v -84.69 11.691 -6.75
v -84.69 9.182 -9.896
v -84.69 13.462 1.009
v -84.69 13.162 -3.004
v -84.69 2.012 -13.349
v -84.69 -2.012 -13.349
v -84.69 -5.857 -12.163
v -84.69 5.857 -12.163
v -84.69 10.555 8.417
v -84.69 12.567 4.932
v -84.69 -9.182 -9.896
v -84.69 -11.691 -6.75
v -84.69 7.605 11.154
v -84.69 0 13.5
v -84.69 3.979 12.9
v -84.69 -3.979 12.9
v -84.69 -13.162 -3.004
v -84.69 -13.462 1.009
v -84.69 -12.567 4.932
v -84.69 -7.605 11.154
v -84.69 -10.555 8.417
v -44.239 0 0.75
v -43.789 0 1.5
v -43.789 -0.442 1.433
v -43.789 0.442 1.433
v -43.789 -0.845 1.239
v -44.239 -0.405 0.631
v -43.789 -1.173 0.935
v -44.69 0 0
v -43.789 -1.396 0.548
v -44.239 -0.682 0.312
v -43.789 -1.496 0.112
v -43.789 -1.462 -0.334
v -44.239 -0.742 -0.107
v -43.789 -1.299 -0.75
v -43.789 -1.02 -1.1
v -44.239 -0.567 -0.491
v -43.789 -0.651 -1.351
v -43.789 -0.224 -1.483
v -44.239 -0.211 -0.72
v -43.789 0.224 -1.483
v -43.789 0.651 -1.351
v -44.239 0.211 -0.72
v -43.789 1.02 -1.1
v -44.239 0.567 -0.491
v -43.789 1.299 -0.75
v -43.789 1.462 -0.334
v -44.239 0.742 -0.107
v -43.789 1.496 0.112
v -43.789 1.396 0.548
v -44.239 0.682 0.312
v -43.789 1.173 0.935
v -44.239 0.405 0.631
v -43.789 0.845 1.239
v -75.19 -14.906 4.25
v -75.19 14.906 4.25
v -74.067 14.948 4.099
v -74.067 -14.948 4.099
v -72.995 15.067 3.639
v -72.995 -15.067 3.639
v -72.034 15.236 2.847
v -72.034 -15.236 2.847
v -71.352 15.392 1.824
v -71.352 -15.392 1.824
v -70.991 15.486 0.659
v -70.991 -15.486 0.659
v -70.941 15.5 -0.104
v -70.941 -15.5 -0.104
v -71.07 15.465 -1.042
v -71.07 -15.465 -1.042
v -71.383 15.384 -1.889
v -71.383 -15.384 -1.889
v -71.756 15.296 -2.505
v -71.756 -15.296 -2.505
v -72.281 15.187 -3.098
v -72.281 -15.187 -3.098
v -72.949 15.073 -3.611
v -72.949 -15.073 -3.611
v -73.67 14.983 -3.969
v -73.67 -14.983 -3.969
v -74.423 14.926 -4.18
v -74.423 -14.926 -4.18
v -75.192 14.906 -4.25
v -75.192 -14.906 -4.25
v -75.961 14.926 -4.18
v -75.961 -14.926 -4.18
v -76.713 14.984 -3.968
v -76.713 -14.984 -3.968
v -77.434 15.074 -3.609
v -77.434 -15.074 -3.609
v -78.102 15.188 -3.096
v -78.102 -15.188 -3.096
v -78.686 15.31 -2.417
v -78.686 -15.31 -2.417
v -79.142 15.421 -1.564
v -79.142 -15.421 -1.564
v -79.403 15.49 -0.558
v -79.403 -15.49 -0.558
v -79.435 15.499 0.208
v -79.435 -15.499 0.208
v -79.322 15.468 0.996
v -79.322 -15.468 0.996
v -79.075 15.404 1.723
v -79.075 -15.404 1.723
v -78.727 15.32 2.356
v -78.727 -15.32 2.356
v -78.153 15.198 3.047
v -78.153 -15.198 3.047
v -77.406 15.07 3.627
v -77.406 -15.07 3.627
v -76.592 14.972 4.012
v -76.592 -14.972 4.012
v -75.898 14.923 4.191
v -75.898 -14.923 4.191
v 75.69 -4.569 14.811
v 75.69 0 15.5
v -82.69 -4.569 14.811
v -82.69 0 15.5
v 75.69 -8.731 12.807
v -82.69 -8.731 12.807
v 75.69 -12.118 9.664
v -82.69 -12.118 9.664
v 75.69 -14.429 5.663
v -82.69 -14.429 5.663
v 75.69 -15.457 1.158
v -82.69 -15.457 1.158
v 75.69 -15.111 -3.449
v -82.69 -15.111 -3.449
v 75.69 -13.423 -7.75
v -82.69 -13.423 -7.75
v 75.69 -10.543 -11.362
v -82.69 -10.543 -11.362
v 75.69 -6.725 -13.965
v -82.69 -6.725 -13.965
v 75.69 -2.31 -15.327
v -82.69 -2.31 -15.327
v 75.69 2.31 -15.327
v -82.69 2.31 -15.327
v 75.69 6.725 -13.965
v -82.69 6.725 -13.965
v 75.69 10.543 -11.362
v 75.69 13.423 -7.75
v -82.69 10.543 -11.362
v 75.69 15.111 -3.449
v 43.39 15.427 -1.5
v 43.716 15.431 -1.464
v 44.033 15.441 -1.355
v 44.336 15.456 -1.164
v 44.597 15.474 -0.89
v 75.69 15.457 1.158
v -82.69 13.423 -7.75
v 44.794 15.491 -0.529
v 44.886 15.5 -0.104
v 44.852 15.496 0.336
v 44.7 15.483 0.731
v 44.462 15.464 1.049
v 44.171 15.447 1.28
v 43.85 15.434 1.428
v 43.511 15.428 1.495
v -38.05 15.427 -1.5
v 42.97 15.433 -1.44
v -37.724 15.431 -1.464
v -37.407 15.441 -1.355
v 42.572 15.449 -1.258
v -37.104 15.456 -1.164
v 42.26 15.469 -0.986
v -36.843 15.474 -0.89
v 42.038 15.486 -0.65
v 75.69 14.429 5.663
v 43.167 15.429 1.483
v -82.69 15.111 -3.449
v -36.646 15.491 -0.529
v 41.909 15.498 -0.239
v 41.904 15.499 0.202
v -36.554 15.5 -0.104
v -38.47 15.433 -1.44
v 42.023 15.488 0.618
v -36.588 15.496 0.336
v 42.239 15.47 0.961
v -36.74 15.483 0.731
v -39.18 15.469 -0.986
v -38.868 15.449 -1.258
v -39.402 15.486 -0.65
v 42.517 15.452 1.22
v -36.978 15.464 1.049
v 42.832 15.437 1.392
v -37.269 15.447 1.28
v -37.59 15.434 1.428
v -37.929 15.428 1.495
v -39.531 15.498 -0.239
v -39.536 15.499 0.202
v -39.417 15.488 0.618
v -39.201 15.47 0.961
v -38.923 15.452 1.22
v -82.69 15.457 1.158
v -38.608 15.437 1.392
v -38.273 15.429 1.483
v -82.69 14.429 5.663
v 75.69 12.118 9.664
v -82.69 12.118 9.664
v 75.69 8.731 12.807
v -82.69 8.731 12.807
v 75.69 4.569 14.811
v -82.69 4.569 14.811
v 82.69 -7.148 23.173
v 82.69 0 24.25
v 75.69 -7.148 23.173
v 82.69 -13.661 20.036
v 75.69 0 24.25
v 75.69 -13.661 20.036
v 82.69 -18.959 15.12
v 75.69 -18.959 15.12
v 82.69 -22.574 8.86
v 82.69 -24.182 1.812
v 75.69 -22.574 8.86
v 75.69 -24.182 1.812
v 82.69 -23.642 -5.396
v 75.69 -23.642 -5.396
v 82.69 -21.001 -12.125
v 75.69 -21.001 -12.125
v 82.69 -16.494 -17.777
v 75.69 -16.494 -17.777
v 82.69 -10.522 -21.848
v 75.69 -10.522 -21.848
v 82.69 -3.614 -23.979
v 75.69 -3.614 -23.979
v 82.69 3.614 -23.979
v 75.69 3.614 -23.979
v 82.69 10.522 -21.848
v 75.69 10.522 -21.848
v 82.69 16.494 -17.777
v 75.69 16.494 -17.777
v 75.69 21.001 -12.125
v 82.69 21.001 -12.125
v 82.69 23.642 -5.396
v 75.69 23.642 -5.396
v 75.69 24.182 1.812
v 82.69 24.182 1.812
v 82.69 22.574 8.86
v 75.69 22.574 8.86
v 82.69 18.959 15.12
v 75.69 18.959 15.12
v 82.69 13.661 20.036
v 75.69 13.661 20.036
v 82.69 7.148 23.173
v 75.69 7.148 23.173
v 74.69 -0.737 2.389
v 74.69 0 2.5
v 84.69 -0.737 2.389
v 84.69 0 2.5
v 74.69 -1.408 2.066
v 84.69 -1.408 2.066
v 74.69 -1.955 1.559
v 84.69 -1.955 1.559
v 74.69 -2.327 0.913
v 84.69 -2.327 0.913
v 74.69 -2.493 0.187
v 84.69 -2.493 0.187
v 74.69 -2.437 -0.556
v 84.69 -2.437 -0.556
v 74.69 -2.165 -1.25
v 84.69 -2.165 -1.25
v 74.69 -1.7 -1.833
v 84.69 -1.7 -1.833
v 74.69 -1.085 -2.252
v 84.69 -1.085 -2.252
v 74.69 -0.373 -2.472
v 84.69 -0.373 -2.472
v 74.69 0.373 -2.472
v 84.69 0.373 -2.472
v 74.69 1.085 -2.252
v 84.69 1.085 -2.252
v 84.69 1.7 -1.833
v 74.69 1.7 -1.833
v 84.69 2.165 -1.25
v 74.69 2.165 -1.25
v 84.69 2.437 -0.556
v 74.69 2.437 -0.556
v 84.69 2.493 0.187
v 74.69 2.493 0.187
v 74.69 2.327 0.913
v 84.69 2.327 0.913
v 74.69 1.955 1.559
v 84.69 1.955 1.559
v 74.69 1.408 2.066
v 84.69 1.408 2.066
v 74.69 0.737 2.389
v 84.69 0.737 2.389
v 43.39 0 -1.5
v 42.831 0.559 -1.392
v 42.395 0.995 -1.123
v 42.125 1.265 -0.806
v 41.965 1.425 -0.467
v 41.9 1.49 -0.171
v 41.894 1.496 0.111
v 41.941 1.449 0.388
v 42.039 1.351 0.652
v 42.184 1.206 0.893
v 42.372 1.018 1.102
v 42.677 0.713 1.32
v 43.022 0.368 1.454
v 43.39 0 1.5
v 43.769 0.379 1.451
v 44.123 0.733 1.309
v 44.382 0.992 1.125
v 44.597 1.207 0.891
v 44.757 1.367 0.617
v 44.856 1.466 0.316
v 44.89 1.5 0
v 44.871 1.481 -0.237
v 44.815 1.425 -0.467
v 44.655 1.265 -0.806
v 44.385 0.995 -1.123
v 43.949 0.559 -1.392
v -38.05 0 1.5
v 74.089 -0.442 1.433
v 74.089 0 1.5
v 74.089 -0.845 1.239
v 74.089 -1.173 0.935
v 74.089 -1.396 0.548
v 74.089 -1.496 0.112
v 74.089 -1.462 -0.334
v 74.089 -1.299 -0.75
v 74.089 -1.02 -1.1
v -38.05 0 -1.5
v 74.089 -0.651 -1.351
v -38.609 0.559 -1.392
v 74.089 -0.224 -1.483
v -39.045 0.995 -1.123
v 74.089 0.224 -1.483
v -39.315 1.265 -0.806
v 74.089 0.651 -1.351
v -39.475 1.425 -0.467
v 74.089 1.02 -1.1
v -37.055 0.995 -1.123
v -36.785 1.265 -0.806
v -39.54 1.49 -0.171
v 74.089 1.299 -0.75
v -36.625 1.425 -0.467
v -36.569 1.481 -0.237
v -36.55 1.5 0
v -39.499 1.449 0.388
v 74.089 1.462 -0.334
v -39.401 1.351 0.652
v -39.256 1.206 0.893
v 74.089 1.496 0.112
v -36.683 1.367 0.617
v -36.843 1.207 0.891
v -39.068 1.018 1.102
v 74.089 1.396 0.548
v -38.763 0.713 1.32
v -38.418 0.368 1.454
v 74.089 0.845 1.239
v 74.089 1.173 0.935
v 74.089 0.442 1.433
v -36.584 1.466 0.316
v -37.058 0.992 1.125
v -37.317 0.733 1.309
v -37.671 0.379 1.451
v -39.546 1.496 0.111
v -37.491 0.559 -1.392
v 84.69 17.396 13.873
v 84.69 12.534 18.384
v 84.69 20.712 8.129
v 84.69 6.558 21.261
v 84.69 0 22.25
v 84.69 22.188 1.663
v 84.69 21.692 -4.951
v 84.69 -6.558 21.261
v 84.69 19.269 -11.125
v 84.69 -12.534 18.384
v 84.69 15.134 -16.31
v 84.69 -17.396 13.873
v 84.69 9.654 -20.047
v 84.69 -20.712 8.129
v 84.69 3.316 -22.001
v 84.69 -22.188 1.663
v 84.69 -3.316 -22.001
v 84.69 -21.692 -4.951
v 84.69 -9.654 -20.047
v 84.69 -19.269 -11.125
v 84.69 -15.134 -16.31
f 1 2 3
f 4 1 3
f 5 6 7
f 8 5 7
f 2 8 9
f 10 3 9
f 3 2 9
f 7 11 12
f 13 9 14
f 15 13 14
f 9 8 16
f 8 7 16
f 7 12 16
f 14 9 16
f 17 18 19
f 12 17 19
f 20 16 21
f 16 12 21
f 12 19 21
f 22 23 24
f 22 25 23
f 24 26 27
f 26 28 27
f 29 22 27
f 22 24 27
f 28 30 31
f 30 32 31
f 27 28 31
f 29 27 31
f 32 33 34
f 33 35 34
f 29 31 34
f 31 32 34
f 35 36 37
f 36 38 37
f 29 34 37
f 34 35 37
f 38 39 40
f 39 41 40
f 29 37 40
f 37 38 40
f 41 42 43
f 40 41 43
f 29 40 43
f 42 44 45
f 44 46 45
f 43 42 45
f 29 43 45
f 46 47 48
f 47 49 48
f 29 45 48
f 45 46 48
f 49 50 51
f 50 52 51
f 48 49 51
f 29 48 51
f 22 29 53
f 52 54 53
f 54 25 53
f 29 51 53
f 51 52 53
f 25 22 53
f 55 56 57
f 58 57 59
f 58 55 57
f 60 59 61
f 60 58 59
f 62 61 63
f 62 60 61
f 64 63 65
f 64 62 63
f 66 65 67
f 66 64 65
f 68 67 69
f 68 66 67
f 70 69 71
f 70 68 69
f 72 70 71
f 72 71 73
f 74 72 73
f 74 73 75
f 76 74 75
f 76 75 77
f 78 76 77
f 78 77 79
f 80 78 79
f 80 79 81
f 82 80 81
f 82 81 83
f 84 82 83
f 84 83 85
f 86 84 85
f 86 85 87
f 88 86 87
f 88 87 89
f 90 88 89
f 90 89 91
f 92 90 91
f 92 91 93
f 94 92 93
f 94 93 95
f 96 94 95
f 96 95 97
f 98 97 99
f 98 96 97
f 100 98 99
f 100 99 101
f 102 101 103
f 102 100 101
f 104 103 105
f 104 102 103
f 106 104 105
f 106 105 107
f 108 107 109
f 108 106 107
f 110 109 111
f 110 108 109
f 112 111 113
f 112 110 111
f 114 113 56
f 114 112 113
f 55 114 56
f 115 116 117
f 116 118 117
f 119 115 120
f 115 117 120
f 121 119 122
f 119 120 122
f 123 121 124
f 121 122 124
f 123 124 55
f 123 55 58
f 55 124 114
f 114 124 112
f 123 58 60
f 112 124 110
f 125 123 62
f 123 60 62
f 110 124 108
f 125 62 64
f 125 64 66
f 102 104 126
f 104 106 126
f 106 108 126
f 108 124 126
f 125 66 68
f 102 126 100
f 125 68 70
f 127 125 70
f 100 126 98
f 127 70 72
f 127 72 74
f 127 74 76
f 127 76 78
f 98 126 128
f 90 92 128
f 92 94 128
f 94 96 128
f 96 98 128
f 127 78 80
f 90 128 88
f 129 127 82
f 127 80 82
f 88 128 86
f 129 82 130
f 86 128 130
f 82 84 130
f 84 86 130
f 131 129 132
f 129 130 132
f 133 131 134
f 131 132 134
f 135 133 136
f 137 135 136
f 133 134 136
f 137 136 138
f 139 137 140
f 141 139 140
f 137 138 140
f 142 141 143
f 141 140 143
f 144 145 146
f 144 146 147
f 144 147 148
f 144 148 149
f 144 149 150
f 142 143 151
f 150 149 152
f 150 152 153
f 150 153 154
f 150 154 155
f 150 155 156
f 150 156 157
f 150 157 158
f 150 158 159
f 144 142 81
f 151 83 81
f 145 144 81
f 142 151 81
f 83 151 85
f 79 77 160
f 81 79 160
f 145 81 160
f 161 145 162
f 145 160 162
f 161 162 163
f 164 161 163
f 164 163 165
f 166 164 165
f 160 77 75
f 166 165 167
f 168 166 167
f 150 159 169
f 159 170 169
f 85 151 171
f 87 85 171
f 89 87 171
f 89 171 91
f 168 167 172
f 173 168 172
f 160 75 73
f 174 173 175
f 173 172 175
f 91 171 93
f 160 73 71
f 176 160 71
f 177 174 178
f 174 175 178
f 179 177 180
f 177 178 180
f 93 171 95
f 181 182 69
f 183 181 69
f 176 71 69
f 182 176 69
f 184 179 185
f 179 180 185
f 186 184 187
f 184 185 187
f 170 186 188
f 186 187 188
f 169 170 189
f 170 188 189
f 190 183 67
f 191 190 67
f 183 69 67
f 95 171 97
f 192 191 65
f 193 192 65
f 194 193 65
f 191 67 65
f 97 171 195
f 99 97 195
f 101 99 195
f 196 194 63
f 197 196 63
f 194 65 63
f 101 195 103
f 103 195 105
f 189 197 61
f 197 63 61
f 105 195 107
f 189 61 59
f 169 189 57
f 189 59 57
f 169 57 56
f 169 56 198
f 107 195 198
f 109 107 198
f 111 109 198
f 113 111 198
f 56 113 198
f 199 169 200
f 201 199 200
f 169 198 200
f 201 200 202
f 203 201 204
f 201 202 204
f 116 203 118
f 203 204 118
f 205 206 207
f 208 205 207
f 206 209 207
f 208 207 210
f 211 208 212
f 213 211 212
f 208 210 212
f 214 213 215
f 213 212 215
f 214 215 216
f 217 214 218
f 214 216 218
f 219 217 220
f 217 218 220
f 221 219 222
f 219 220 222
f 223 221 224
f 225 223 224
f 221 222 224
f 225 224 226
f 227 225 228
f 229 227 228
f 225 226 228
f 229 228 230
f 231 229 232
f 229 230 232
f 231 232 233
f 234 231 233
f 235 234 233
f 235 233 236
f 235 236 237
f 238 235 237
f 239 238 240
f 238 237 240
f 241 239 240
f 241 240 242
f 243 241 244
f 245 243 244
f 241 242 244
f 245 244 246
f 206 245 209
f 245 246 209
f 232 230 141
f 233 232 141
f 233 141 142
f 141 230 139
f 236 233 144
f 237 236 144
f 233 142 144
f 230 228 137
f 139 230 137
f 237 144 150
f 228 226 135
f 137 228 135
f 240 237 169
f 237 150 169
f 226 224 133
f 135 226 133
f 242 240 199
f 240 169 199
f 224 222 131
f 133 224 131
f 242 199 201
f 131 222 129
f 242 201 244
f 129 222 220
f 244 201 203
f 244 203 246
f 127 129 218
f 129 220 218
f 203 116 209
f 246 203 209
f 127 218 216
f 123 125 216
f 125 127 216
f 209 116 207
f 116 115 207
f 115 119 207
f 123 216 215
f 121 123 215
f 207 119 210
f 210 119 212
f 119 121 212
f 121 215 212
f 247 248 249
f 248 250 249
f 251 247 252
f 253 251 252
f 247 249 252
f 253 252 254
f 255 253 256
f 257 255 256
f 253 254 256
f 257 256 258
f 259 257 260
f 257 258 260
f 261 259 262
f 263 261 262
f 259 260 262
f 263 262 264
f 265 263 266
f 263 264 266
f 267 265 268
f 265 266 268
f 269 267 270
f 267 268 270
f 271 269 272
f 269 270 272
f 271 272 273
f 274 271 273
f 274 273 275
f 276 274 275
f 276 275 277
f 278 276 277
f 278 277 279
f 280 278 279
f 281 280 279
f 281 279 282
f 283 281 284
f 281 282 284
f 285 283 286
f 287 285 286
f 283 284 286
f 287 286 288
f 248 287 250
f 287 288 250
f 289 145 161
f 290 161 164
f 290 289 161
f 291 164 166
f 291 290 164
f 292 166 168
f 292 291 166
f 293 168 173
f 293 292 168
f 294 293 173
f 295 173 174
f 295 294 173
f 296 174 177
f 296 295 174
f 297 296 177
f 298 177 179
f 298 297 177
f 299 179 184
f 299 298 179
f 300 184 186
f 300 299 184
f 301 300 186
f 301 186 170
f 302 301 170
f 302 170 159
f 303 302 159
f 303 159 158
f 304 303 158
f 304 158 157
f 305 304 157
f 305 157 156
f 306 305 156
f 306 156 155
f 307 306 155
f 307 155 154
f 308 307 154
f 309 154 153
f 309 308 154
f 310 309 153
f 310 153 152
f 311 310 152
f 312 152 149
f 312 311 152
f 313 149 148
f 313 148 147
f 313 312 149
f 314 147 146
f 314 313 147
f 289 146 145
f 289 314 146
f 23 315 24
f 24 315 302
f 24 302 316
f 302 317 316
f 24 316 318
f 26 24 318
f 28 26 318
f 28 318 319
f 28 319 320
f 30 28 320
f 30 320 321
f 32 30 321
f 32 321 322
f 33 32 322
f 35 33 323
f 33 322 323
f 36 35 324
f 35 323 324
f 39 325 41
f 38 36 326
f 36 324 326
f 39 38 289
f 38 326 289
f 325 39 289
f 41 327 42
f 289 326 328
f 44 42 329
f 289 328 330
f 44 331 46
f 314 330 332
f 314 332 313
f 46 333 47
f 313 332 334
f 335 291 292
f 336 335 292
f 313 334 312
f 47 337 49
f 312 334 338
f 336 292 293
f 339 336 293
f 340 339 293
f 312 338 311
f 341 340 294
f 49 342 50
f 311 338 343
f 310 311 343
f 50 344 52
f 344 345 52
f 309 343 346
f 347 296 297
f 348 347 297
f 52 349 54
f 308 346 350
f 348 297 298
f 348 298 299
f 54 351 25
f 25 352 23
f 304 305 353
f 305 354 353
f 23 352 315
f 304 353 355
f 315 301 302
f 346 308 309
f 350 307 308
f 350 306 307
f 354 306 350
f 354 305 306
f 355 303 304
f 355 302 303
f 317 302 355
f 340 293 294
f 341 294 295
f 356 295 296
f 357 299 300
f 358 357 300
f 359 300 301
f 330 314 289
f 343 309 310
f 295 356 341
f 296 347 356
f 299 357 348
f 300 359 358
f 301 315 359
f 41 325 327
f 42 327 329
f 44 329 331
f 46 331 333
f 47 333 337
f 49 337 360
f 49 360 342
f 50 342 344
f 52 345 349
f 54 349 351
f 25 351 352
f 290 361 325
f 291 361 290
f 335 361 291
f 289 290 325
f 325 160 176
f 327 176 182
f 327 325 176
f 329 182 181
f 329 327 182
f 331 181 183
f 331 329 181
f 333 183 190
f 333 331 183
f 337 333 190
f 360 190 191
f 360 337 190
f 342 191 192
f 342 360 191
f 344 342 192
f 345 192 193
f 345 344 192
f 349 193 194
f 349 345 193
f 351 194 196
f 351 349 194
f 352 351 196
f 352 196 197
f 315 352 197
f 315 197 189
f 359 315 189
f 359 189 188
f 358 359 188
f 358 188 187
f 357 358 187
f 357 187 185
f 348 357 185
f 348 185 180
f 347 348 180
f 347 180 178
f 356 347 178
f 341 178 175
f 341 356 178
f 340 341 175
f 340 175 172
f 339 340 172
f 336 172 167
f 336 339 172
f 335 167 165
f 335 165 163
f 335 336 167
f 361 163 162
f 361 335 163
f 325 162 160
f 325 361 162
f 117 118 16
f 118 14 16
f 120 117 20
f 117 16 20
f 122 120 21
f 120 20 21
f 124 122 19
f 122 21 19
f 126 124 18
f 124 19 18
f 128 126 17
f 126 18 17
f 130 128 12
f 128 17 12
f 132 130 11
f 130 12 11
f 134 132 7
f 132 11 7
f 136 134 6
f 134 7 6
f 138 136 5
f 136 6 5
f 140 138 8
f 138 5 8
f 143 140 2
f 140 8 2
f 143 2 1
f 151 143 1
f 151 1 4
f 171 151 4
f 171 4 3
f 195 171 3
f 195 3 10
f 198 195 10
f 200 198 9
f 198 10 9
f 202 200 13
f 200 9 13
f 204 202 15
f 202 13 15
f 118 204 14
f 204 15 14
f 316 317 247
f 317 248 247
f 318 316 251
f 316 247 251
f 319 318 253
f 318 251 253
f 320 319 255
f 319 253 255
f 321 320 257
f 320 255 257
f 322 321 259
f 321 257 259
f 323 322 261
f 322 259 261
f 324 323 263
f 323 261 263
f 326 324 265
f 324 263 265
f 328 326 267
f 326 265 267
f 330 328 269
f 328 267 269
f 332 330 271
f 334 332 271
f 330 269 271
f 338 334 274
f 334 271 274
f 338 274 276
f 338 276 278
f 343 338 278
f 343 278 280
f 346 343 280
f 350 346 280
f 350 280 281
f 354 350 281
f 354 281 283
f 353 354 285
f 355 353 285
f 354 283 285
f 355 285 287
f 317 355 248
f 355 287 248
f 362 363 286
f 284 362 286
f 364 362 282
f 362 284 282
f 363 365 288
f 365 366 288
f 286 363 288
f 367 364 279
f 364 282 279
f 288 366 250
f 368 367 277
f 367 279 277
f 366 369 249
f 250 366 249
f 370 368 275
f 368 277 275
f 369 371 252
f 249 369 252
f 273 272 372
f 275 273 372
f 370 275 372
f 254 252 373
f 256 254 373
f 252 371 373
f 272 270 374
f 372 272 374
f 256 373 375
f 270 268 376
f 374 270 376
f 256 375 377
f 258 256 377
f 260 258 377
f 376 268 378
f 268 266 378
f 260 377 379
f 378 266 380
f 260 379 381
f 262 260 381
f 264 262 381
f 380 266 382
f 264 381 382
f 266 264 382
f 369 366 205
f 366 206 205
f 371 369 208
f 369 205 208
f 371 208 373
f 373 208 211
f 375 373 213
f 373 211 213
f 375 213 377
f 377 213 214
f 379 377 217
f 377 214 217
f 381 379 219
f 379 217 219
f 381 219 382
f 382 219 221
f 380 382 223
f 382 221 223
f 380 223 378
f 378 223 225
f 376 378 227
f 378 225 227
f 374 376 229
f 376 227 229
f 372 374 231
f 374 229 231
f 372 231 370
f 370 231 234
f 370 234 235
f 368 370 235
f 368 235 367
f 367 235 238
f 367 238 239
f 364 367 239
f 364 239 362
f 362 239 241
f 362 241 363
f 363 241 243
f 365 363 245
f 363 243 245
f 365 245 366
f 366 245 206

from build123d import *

# Parameters (mm, degrees)
ESBO_O2_R                  = 1.5
CORTE_EXTRUS_O1_DEPTH      = 92.370241873
CORTE_EXTRUS_O2_DEPTH      = 92.370241873
CORTE_EXTRUS_O2_DEPTH_BACK = 92.370241873
ESBO_O3_R                  = 4.25


with BuildPart() as part:
    # Esboço1 → Revolução1 (revolve)
    with BuildSketch(Plane.XY, mode=Mode.PRIVATE) as revolu_o1_sk:
        Polygon((84.69, 2.5), (84.69, 22.25), (82.69, 24.25), (75.69, 24.25), (75.69, 15.5), (-82.69, 15.5), (-84.69, 13.5), (-84.69, 0), (-44.69, 0), (-43.788709071, 1.5), (74.089139381, 1.5), (74.69, 2.5), align=None)
    revolve(revolu_o1_sk.sketch.rotate(Axis((-84.69, 0, 0), (1, 0, 0)), 90), axis=Axis((-84.69, 0, 0), (1, 0, 0)))

    # Esboço2 → Corte-extrusão1 (cut, through all)
    with BuildSketch(Plane(origin=(0, 0, 0), x_dir=(1, 0, 0), z_dir=(0, 1, 0))):
        with Locations(Location((43.39, 0, 0), (0, 0, 90))):
            Circle(ESBO_O2_R)
        with Locations(Location((-38.05, 0, 0), (0, 0, 90))):
            Circle(ESBO_O2_R)
    extrude(amount=CORTE_EXTRUS_O1_DEPTH, mode=Mode.SUBTRACT)

    # Esboço3 → Corte-extrusão2 (cut, two sides: drawn at the far end of the back side and taken through both)
    with BuildSketch(Plane(origin=(0, 0, 0), x_dir=(1, 0, 0), z_dir=(0, 1, 0)).offset(-CORTE_EXTRUS_O2_DEPTH_BACK)):
        with Locations(Location((-75.19, 0, 0), (0, 0, 270))):
            Circle(ESBO_O3_R)
    extrude(amount=CORTE_EXTRUS_O2_DEPTH + CORTE_EXTRUS_O2_DEPTH_BACK, mode=Mode.SUBTRACT)


solid = part.part
